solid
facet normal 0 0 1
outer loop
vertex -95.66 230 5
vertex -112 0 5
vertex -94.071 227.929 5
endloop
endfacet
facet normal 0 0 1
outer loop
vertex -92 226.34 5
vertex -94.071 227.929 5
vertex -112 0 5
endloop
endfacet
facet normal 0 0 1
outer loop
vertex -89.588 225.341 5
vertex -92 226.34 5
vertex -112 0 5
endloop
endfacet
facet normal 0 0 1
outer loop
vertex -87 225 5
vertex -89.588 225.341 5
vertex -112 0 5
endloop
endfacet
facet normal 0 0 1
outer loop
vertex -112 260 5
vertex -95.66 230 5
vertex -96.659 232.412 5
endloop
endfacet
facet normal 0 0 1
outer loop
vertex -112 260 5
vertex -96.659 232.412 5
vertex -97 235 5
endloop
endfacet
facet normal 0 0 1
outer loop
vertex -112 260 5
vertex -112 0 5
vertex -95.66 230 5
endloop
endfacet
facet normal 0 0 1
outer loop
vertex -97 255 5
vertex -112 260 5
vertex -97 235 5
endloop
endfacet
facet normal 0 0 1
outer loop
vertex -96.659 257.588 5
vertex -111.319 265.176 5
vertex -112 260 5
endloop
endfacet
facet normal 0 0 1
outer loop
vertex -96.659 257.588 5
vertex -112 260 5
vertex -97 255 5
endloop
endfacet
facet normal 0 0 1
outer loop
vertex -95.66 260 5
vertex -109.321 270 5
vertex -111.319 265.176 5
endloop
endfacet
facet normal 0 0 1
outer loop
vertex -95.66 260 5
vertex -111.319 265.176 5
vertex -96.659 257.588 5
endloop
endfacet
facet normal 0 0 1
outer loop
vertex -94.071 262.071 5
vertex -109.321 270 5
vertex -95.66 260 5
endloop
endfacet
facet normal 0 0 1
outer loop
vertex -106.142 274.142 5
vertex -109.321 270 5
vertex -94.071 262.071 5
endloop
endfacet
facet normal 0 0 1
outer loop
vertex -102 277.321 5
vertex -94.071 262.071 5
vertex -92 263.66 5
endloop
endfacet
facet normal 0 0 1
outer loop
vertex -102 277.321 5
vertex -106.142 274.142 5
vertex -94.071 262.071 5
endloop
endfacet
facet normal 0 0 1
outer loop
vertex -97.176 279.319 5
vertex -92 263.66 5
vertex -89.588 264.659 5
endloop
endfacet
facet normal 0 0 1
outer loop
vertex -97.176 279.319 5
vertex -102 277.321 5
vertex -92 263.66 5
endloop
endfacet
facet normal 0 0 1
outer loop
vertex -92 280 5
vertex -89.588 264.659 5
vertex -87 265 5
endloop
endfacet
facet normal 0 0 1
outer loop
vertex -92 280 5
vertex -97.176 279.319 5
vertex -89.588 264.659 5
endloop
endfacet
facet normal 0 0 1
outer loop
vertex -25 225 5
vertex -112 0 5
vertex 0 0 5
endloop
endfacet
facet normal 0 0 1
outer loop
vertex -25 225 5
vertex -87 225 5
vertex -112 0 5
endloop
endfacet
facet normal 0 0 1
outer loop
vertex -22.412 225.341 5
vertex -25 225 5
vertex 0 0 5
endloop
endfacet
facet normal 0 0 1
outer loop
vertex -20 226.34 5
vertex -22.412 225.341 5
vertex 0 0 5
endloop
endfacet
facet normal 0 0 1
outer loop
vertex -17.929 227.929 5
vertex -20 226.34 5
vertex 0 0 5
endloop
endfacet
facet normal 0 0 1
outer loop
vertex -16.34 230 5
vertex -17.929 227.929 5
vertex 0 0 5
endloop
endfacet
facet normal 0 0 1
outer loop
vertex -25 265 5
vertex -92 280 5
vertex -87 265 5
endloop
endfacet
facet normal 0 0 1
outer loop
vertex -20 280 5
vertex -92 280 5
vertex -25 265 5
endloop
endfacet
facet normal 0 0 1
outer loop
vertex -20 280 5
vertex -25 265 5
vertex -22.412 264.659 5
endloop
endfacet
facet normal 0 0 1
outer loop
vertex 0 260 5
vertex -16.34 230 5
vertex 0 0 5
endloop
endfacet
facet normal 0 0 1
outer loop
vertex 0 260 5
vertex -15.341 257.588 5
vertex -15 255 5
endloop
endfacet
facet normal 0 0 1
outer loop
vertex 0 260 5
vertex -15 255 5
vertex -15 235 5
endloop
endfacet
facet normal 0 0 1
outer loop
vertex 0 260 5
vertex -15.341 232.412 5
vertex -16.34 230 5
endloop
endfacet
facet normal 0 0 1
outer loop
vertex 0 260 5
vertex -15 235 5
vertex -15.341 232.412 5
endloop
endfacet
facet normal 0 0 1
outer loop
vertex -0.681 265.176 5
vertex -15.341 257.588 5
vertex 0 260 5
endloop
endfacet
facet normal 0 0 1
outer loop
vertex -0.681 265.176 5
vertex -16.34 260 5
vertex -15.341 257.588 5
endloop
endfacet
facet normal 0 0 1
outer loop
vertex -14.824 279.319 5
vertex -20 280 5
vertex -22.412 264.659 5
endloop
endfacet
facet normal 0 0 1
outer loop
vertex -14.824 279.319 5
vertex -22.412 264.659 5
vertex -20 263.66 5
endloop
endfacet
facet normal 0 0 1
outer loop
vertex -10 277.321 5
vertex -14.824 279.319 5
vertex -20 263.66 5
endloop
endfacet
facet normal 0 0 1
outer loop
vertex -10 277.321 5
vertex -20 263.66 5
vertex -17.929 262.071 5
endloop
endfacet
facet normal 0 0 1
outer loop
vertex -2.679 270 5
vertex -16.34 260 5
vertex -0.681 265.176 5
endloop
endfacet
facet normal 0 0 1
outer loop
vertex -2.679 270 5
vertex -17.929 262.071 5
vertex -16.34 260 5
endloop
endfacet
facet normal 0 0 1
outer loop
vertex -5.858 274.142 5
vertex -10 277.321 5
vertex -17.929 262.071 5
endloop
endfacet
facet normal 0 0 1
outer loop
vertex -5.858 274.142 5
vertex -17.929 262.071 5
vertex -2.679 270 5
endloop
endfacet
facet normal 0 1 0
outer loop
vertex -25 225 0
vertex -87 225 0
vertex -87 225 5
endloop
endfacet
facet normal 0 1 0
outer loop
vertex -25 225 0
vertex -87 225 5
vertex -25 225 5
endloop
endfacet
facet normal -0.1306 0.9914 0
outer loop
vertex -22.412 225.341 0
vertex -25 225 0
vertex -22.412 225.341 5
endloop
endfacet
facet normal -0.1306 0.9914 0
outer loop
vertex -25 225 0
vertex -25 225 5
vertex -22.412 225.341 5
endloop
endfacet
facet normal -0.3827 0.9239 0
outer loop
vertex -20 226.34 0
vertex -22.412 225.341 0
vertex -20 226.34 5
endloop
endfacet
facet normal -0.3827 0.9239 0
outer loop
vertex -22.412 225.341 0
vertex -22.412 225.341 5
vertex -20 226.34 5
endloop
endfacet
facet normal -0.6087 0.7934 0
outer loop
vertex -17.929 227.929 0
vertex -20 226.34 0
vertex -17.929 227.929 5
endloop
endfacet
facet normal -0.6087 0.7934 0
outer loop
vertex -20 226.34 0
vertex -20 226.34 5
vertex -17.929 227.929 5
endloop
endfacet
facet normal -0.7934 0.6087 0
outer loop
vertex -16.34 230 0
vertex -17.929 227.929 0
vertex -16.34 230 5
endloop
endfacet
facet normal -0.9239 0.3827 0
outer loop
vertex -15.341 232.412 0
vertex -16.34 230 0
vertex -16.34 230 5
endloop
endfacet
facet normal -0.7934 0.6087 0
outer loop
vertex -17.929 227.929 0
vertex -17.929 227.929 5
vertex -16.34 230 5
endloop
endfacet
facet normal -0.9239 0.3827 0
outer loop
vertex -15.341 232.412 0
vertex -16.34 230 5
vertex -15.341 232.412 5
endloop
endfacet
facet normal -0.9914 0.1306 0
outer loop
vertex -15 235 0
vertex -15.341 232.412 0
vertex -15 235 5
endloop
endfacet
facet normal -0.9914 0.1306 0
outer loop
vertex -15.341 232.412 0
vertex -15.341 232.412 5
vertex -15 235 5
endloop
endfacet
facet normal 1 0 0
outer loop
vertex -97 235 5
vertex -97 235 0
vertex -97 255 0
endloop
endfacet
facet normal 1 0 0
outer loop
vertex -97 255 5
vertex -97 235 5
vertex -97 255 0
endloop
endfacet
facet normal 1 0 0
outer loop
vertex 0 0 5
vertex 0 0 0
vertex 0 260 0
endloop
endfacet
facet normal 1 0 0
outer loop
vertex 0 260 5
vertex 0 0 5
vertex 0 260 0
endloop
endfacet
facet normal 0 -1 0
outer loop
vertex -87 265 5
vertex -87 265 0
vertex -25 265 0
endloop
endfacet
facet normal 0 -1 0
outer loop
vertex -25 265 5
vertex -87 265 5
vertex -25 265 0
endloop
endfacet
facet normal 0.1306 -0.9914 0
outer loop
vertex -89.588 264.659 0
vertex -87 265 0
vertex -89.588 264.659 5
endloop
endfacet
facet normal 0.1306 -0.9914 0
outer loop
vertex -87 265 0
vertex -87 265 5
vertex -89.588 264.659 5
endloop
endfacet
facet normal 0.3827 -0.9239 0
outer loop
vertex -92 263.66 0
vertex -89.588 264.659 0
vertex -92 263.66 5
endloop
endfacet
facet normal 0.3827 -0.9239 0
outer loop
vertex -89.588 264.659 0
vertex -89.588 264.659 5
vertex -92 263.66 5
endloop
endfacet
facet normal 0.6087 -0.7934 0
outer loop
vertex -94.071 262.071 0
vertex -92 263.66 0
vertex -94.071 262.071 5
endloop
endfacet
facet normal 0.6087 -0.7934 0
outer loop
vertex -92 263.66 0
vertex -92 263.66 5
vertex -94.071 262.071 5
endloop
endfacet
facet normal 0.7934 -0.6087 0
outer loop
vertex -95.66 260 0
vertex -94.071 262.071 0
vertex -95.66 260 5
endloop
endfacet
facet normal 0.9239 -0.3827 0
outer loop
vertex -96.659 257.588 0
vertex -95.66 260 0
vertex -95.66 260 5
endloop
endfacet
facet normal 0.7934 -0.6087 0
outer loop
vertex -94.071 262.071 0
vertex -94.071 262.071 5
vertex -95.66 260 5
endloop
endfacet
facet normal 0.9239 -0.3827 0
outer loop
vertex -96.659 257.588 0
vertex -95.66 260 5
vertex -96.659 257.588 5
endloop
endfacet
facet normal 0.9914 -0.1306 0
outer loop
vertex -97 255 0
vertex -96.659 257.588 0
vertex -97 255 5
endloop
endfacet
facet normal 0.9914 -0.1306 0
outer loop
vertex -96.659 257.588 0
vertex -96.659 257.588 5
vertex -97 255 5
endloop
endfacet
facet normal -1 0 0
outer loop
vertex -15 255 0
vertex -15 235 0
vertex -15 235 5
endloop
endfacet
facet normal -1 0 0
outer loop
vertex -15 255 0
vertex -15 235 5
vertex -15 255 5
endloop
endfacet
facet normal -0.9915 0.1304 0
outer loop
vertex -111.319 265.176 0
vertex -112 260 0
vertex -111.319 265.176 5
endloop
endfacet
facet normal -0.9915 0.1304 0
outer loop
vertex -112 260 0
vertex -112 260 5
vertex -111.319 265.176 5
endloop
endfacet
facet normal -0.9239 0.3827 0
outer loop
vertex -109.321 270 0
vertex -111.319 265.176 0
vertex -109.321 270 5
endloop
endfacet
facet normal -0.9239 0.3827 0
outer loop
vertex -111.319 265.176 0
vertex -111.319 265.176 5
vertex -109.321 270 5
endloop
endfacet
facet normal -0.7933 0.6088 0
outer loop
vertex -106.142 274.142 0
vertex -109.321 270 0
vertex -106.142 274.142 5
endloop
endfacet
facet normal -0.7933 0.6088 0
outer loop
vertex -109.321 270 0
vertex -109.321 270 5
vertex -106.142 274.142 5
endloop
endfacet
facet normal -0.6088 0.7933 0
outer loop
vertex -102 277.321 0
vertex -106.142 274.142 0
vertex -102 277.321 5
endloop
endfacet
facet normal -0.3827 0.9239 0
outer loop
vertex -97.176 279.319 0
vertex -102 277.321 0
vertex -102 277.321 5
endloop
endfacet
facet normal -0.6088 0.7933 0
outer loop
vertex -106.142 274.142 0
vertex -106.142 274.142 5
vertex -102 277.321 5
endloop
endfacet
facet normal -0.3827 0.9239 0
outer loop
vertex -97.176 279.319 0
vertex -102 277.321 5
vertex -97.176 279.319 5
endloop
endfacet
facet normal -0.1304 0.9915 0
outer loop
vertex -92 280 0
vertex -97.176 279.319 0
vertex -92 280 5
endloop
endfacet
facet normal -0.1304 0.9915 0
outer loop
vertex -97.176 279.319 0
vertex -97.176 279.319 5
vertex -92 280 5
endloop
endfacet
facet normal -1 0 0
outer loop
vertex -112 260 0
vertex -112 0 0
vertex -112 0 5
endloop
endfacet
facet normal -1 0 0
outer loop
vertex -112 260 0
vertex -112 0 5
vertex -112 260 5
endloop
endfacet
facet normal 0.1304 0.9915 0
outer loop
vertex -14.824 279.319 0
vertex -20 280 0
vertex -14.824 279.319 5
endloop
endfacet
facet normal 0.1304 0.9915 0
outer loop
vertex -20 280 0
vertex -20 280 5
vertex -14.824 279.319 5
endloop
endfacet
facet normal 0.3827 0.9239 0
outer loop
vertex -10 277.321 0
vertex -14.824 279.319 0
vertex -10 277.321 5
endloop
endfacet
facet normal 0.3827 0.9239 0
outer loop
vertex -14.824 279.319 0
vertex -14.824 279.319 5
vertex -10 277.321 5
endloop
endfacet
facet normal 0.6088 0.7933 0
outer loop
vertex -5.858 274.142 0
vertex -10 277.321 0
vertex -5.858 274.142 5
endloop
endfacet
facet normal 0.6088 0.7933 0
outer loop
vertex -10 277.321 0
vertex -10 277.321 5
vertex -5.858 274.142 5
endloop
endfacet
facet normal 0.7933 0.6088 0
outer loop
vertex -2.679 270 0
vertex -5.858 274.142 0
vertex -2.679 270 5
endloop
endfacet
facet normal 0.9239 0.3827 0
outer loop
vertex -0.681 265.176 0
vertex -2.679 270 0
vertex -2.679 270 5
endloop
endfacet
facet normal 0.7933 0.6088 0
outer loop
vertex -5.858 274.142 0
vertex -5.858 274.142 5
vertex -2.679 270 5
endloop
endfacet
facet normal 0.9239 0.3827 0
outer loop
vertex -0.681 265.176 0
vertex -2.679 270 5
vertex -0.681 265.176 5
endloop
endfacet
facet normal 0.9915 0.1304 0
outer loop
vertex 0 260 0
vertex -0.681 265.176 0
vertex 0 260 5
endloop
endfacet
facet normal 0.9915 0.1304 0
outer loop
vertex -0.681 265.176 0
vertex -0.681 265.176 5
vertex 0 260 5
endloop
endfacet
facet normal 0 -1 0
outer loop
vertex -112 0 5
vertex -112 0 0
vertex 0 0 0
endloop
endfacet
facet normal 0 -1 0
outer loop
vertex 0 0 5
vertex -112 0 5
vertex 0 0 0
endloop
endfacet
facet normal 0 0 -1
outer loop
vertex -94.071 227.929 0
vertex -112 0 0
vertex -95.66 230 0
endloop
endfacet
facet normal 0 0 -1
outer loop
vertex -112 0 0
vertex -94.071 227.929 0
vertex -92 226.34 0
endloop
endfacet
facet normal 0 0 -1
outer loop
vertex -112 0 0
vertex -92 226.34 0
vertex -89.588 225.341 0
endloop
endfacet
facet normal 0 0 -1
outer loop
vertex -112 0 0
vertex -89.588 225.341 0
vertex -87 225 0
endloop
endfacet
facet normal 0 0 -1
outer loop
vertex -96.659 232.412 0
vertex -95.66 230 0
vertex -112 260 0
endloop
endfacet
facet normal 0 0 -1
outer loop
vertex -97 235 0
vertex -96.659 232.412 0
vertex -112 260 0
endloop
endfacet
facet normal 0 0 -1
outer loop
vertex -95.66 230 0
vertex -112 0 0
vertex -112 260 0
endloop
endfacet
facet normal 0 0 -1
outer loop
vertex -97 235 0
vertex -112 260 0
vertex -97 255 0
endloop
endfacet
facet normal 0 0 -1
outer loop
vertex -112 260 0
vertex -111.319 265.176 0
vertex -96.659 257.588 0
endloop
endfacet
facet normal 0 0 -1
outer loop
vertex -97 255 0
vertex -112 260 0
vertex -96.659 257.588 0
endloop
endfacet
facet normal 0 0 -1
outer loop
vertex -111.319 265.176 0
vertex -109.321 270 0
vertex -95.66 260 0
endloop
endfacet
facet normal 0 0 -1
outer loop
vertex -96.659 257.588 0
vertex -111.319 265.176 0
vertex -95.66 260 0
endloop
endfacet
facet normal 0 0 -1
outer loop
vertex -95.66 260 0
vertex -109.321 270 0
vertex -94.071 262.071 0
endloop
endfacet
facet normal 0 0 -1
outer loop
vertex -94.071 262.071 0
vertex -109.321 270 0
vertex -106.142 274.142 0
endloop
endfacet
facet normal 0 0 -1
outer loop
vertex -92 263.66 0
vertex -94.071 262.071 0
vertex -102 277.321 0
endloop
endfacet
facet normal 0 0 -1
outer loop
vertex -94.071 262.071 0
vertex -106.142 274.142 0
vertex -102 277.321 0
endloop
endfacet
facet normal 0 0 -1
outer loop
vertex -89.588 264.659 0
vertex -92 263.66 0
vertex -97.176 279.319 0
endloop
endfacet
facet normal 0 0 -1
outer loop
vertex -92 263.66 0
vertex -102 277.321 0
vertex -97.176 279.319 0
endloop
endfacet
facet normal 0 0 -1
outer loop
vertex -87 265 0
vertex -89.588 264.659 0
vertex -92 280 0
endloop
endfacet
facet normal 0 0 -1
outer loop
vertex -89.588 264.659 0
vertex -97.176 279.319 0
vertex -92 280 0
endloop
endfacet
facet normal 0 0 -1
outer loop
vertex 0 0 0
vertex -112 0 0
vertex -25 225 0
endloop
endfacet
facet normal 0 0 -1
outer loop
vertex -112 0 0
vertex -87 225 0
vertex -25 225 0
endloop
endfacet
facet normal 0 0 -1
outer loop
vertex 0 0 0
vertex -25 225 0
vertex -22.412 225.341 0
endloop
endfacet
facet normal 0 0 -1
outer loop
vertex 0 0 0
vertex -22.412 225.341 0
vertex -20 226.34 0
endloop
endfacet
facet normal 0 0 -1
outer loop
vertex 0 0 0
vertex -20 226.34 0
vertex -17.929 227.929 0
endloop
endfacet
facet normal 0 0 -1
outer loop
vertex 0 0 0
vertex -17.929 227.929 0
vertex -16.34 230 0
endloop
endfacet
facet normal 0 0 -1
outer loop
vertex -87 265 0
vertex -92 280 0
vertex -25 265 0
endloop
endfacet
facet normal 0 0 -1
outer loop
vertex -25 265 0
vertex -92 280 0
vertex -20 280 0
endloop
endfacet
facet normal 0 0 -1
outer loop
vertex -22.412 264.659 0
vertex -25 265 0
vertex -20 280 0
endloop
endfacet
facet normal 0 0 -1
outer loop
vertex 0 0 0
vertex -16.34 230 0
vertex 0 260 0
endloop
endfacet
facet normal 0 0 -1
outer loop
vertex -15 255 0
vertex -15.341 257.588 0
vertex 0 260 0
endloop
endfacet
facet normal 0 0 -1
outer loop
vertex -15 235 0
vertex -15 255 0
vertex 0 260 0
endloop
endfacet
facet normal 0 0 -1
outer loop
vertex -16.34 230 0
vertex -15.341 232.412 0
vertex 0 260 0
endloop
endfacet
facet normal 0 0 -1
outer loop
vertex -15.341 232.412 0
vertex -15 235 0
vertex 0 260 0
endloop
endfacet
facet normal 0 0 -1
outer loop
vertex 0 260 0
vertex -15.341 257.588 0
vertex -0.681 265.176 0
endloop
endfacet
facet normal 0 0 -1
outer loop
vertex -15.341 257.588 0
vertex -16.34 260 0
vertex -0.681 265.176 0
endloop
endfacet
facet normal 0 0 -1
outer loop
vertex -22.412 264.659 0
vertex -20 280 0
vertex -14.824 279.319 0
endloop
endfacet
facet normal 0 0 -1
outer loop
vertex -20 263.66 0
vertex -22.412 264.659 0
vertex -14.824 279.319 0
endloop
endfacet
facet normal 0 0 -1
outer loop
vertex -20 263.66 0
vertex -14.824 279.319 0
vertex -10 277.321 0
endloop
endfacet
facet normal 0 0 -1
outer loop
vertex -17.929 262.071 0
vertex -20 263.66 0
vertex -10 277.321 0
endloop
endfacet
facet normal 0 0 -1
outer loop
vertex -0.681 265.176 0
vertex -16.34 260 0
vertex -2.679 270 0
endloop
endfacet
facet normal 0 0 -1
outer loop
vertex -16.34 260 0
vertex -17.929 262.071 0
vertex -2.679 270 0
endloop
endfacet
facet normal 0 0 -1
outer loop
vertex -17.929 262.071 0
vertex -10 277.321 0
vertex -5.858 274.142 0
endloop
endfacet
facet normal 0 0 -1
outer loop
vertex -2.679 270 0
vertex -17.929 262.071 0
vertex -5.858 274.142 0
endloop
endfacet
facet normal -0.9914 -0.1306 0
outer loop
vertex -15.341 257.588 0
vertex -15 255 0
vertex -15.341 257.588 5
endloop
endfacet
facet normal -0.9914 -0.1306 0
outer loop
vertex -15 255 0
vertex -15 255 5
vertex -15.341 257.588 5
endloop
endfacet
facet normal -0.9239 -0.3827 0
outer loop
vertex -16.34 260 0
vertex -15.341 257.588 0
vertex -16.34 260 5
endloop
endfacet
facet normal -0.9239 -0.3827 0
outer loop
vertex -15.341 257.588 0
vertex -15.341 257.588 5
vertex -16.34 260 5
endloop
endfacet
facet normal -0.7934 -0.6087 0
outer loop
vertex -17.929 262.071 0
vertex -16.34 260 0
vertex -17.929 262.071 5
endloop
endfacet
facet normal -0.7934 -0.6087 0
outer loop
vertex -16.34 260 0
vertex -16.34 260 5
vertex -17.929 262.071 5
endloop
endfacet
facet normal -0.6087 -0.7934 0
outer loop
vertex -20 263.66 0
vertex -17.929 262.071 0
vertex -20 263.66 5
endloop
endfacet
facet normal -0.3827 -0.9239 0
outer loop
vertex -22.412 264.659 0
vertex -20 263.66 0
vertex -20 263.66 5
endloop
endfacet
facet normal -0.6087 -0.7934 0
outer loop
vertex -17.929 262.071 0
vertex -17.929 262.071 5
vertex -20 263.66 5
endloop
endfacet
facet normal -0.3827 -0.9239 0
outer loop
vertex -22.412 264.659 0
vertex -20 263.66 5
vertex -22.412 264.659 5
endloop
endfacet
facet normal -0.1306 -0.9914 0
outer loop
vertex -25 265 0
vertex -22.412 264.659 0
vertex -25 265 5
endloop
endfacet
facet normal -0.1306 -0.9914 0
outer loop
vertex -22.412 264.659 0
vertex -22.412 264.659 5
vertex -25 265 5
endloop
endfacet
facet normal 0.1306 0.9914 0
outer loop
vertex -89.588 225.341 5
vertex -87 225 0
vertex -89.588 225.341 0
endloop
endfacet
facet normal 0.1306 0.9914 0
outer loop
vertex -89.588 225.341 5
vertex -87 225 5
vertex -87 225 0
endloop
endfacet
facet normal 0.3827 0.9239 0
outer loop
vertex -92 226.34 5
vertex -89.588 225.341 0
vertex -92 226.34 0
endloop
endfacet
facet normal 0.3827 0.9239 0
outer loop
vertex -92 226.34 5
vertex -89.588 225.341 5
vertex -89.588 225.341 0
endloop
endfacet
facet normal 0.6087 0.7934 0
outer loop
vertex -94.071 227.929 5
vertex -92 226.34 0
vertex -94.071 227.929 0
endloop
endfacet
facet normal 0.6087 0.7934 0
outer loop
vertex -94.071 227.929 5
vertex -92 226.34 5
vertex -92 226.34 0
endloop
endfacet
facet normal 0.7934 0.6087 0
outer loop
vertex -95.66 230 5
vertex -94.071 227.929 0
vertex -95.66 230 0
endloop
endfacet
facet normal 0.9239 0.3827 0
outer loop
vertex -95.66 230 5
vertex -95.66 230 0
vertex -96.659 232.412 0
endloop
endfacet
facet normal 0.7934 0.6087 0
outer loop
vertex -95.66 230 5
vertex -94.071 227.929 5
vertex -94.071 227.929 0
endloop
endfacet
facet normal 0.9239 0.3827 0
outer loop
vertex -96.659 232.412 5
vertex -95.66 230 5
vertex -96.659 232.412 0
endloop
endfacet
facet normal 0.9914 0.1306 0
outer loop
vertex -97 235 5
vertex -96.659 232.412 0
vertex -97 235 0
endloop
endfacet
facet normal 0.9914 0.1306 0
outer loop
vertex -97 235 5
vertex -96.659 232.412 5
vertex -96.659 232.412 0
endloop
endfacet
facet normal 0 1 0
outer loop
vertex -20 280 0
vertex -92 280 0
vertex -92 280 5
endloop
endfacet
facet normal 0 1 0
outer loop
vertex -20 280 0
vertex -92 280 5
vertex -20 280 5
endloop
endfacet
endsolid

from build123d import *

# Parameters (mm, degrees)
SKETCH1_W           = 112
SKETCH1_H           = 280
SKETCH1_W_2         = 82
SKETCH1_H_2         = 40
BOSS_EXTRUDE1_DEPTH = 5
FILLET1_R           = 20
FILLET2_R           = 10


with BuildPart() as part:
    # Sketch1 → Boss-Extrude1 (new body)
    with BuildSketch(Plane.XY):
        with Locations((-56, 140)):
            Rectangle(SKETCH1_W, SKETCH1_H)
        with Locations((-56, 245)):
            Rectangle(SKETCH1_W_2, SKETCH1_H_2, mode=Mode.SUBTRACT)
    extrude(amount=BOSS_EXTRUDE1_DEPTH)

    # Fillet1
    fillet1_edges = [part.edges().sort_by_distance(p)[0] for p in [
        (-112, 280, 2.5),
        (0, 280, 2.5),
    ]]
    fillet(fillet1_edges, radius=FILLET1_R)

    # Fillet2
    fillet2_edges = [part.edges().sort_by_distance(p)[0] for p in [
        (-15, 225, 2.5),
        (-15, 265, 2.5),
        (-97, 265, 2.5),
        (-97, 225, 2.5),
    ]]
    fillet(fillet2_edges, radius=FILLET2_R)


solid = part.part
